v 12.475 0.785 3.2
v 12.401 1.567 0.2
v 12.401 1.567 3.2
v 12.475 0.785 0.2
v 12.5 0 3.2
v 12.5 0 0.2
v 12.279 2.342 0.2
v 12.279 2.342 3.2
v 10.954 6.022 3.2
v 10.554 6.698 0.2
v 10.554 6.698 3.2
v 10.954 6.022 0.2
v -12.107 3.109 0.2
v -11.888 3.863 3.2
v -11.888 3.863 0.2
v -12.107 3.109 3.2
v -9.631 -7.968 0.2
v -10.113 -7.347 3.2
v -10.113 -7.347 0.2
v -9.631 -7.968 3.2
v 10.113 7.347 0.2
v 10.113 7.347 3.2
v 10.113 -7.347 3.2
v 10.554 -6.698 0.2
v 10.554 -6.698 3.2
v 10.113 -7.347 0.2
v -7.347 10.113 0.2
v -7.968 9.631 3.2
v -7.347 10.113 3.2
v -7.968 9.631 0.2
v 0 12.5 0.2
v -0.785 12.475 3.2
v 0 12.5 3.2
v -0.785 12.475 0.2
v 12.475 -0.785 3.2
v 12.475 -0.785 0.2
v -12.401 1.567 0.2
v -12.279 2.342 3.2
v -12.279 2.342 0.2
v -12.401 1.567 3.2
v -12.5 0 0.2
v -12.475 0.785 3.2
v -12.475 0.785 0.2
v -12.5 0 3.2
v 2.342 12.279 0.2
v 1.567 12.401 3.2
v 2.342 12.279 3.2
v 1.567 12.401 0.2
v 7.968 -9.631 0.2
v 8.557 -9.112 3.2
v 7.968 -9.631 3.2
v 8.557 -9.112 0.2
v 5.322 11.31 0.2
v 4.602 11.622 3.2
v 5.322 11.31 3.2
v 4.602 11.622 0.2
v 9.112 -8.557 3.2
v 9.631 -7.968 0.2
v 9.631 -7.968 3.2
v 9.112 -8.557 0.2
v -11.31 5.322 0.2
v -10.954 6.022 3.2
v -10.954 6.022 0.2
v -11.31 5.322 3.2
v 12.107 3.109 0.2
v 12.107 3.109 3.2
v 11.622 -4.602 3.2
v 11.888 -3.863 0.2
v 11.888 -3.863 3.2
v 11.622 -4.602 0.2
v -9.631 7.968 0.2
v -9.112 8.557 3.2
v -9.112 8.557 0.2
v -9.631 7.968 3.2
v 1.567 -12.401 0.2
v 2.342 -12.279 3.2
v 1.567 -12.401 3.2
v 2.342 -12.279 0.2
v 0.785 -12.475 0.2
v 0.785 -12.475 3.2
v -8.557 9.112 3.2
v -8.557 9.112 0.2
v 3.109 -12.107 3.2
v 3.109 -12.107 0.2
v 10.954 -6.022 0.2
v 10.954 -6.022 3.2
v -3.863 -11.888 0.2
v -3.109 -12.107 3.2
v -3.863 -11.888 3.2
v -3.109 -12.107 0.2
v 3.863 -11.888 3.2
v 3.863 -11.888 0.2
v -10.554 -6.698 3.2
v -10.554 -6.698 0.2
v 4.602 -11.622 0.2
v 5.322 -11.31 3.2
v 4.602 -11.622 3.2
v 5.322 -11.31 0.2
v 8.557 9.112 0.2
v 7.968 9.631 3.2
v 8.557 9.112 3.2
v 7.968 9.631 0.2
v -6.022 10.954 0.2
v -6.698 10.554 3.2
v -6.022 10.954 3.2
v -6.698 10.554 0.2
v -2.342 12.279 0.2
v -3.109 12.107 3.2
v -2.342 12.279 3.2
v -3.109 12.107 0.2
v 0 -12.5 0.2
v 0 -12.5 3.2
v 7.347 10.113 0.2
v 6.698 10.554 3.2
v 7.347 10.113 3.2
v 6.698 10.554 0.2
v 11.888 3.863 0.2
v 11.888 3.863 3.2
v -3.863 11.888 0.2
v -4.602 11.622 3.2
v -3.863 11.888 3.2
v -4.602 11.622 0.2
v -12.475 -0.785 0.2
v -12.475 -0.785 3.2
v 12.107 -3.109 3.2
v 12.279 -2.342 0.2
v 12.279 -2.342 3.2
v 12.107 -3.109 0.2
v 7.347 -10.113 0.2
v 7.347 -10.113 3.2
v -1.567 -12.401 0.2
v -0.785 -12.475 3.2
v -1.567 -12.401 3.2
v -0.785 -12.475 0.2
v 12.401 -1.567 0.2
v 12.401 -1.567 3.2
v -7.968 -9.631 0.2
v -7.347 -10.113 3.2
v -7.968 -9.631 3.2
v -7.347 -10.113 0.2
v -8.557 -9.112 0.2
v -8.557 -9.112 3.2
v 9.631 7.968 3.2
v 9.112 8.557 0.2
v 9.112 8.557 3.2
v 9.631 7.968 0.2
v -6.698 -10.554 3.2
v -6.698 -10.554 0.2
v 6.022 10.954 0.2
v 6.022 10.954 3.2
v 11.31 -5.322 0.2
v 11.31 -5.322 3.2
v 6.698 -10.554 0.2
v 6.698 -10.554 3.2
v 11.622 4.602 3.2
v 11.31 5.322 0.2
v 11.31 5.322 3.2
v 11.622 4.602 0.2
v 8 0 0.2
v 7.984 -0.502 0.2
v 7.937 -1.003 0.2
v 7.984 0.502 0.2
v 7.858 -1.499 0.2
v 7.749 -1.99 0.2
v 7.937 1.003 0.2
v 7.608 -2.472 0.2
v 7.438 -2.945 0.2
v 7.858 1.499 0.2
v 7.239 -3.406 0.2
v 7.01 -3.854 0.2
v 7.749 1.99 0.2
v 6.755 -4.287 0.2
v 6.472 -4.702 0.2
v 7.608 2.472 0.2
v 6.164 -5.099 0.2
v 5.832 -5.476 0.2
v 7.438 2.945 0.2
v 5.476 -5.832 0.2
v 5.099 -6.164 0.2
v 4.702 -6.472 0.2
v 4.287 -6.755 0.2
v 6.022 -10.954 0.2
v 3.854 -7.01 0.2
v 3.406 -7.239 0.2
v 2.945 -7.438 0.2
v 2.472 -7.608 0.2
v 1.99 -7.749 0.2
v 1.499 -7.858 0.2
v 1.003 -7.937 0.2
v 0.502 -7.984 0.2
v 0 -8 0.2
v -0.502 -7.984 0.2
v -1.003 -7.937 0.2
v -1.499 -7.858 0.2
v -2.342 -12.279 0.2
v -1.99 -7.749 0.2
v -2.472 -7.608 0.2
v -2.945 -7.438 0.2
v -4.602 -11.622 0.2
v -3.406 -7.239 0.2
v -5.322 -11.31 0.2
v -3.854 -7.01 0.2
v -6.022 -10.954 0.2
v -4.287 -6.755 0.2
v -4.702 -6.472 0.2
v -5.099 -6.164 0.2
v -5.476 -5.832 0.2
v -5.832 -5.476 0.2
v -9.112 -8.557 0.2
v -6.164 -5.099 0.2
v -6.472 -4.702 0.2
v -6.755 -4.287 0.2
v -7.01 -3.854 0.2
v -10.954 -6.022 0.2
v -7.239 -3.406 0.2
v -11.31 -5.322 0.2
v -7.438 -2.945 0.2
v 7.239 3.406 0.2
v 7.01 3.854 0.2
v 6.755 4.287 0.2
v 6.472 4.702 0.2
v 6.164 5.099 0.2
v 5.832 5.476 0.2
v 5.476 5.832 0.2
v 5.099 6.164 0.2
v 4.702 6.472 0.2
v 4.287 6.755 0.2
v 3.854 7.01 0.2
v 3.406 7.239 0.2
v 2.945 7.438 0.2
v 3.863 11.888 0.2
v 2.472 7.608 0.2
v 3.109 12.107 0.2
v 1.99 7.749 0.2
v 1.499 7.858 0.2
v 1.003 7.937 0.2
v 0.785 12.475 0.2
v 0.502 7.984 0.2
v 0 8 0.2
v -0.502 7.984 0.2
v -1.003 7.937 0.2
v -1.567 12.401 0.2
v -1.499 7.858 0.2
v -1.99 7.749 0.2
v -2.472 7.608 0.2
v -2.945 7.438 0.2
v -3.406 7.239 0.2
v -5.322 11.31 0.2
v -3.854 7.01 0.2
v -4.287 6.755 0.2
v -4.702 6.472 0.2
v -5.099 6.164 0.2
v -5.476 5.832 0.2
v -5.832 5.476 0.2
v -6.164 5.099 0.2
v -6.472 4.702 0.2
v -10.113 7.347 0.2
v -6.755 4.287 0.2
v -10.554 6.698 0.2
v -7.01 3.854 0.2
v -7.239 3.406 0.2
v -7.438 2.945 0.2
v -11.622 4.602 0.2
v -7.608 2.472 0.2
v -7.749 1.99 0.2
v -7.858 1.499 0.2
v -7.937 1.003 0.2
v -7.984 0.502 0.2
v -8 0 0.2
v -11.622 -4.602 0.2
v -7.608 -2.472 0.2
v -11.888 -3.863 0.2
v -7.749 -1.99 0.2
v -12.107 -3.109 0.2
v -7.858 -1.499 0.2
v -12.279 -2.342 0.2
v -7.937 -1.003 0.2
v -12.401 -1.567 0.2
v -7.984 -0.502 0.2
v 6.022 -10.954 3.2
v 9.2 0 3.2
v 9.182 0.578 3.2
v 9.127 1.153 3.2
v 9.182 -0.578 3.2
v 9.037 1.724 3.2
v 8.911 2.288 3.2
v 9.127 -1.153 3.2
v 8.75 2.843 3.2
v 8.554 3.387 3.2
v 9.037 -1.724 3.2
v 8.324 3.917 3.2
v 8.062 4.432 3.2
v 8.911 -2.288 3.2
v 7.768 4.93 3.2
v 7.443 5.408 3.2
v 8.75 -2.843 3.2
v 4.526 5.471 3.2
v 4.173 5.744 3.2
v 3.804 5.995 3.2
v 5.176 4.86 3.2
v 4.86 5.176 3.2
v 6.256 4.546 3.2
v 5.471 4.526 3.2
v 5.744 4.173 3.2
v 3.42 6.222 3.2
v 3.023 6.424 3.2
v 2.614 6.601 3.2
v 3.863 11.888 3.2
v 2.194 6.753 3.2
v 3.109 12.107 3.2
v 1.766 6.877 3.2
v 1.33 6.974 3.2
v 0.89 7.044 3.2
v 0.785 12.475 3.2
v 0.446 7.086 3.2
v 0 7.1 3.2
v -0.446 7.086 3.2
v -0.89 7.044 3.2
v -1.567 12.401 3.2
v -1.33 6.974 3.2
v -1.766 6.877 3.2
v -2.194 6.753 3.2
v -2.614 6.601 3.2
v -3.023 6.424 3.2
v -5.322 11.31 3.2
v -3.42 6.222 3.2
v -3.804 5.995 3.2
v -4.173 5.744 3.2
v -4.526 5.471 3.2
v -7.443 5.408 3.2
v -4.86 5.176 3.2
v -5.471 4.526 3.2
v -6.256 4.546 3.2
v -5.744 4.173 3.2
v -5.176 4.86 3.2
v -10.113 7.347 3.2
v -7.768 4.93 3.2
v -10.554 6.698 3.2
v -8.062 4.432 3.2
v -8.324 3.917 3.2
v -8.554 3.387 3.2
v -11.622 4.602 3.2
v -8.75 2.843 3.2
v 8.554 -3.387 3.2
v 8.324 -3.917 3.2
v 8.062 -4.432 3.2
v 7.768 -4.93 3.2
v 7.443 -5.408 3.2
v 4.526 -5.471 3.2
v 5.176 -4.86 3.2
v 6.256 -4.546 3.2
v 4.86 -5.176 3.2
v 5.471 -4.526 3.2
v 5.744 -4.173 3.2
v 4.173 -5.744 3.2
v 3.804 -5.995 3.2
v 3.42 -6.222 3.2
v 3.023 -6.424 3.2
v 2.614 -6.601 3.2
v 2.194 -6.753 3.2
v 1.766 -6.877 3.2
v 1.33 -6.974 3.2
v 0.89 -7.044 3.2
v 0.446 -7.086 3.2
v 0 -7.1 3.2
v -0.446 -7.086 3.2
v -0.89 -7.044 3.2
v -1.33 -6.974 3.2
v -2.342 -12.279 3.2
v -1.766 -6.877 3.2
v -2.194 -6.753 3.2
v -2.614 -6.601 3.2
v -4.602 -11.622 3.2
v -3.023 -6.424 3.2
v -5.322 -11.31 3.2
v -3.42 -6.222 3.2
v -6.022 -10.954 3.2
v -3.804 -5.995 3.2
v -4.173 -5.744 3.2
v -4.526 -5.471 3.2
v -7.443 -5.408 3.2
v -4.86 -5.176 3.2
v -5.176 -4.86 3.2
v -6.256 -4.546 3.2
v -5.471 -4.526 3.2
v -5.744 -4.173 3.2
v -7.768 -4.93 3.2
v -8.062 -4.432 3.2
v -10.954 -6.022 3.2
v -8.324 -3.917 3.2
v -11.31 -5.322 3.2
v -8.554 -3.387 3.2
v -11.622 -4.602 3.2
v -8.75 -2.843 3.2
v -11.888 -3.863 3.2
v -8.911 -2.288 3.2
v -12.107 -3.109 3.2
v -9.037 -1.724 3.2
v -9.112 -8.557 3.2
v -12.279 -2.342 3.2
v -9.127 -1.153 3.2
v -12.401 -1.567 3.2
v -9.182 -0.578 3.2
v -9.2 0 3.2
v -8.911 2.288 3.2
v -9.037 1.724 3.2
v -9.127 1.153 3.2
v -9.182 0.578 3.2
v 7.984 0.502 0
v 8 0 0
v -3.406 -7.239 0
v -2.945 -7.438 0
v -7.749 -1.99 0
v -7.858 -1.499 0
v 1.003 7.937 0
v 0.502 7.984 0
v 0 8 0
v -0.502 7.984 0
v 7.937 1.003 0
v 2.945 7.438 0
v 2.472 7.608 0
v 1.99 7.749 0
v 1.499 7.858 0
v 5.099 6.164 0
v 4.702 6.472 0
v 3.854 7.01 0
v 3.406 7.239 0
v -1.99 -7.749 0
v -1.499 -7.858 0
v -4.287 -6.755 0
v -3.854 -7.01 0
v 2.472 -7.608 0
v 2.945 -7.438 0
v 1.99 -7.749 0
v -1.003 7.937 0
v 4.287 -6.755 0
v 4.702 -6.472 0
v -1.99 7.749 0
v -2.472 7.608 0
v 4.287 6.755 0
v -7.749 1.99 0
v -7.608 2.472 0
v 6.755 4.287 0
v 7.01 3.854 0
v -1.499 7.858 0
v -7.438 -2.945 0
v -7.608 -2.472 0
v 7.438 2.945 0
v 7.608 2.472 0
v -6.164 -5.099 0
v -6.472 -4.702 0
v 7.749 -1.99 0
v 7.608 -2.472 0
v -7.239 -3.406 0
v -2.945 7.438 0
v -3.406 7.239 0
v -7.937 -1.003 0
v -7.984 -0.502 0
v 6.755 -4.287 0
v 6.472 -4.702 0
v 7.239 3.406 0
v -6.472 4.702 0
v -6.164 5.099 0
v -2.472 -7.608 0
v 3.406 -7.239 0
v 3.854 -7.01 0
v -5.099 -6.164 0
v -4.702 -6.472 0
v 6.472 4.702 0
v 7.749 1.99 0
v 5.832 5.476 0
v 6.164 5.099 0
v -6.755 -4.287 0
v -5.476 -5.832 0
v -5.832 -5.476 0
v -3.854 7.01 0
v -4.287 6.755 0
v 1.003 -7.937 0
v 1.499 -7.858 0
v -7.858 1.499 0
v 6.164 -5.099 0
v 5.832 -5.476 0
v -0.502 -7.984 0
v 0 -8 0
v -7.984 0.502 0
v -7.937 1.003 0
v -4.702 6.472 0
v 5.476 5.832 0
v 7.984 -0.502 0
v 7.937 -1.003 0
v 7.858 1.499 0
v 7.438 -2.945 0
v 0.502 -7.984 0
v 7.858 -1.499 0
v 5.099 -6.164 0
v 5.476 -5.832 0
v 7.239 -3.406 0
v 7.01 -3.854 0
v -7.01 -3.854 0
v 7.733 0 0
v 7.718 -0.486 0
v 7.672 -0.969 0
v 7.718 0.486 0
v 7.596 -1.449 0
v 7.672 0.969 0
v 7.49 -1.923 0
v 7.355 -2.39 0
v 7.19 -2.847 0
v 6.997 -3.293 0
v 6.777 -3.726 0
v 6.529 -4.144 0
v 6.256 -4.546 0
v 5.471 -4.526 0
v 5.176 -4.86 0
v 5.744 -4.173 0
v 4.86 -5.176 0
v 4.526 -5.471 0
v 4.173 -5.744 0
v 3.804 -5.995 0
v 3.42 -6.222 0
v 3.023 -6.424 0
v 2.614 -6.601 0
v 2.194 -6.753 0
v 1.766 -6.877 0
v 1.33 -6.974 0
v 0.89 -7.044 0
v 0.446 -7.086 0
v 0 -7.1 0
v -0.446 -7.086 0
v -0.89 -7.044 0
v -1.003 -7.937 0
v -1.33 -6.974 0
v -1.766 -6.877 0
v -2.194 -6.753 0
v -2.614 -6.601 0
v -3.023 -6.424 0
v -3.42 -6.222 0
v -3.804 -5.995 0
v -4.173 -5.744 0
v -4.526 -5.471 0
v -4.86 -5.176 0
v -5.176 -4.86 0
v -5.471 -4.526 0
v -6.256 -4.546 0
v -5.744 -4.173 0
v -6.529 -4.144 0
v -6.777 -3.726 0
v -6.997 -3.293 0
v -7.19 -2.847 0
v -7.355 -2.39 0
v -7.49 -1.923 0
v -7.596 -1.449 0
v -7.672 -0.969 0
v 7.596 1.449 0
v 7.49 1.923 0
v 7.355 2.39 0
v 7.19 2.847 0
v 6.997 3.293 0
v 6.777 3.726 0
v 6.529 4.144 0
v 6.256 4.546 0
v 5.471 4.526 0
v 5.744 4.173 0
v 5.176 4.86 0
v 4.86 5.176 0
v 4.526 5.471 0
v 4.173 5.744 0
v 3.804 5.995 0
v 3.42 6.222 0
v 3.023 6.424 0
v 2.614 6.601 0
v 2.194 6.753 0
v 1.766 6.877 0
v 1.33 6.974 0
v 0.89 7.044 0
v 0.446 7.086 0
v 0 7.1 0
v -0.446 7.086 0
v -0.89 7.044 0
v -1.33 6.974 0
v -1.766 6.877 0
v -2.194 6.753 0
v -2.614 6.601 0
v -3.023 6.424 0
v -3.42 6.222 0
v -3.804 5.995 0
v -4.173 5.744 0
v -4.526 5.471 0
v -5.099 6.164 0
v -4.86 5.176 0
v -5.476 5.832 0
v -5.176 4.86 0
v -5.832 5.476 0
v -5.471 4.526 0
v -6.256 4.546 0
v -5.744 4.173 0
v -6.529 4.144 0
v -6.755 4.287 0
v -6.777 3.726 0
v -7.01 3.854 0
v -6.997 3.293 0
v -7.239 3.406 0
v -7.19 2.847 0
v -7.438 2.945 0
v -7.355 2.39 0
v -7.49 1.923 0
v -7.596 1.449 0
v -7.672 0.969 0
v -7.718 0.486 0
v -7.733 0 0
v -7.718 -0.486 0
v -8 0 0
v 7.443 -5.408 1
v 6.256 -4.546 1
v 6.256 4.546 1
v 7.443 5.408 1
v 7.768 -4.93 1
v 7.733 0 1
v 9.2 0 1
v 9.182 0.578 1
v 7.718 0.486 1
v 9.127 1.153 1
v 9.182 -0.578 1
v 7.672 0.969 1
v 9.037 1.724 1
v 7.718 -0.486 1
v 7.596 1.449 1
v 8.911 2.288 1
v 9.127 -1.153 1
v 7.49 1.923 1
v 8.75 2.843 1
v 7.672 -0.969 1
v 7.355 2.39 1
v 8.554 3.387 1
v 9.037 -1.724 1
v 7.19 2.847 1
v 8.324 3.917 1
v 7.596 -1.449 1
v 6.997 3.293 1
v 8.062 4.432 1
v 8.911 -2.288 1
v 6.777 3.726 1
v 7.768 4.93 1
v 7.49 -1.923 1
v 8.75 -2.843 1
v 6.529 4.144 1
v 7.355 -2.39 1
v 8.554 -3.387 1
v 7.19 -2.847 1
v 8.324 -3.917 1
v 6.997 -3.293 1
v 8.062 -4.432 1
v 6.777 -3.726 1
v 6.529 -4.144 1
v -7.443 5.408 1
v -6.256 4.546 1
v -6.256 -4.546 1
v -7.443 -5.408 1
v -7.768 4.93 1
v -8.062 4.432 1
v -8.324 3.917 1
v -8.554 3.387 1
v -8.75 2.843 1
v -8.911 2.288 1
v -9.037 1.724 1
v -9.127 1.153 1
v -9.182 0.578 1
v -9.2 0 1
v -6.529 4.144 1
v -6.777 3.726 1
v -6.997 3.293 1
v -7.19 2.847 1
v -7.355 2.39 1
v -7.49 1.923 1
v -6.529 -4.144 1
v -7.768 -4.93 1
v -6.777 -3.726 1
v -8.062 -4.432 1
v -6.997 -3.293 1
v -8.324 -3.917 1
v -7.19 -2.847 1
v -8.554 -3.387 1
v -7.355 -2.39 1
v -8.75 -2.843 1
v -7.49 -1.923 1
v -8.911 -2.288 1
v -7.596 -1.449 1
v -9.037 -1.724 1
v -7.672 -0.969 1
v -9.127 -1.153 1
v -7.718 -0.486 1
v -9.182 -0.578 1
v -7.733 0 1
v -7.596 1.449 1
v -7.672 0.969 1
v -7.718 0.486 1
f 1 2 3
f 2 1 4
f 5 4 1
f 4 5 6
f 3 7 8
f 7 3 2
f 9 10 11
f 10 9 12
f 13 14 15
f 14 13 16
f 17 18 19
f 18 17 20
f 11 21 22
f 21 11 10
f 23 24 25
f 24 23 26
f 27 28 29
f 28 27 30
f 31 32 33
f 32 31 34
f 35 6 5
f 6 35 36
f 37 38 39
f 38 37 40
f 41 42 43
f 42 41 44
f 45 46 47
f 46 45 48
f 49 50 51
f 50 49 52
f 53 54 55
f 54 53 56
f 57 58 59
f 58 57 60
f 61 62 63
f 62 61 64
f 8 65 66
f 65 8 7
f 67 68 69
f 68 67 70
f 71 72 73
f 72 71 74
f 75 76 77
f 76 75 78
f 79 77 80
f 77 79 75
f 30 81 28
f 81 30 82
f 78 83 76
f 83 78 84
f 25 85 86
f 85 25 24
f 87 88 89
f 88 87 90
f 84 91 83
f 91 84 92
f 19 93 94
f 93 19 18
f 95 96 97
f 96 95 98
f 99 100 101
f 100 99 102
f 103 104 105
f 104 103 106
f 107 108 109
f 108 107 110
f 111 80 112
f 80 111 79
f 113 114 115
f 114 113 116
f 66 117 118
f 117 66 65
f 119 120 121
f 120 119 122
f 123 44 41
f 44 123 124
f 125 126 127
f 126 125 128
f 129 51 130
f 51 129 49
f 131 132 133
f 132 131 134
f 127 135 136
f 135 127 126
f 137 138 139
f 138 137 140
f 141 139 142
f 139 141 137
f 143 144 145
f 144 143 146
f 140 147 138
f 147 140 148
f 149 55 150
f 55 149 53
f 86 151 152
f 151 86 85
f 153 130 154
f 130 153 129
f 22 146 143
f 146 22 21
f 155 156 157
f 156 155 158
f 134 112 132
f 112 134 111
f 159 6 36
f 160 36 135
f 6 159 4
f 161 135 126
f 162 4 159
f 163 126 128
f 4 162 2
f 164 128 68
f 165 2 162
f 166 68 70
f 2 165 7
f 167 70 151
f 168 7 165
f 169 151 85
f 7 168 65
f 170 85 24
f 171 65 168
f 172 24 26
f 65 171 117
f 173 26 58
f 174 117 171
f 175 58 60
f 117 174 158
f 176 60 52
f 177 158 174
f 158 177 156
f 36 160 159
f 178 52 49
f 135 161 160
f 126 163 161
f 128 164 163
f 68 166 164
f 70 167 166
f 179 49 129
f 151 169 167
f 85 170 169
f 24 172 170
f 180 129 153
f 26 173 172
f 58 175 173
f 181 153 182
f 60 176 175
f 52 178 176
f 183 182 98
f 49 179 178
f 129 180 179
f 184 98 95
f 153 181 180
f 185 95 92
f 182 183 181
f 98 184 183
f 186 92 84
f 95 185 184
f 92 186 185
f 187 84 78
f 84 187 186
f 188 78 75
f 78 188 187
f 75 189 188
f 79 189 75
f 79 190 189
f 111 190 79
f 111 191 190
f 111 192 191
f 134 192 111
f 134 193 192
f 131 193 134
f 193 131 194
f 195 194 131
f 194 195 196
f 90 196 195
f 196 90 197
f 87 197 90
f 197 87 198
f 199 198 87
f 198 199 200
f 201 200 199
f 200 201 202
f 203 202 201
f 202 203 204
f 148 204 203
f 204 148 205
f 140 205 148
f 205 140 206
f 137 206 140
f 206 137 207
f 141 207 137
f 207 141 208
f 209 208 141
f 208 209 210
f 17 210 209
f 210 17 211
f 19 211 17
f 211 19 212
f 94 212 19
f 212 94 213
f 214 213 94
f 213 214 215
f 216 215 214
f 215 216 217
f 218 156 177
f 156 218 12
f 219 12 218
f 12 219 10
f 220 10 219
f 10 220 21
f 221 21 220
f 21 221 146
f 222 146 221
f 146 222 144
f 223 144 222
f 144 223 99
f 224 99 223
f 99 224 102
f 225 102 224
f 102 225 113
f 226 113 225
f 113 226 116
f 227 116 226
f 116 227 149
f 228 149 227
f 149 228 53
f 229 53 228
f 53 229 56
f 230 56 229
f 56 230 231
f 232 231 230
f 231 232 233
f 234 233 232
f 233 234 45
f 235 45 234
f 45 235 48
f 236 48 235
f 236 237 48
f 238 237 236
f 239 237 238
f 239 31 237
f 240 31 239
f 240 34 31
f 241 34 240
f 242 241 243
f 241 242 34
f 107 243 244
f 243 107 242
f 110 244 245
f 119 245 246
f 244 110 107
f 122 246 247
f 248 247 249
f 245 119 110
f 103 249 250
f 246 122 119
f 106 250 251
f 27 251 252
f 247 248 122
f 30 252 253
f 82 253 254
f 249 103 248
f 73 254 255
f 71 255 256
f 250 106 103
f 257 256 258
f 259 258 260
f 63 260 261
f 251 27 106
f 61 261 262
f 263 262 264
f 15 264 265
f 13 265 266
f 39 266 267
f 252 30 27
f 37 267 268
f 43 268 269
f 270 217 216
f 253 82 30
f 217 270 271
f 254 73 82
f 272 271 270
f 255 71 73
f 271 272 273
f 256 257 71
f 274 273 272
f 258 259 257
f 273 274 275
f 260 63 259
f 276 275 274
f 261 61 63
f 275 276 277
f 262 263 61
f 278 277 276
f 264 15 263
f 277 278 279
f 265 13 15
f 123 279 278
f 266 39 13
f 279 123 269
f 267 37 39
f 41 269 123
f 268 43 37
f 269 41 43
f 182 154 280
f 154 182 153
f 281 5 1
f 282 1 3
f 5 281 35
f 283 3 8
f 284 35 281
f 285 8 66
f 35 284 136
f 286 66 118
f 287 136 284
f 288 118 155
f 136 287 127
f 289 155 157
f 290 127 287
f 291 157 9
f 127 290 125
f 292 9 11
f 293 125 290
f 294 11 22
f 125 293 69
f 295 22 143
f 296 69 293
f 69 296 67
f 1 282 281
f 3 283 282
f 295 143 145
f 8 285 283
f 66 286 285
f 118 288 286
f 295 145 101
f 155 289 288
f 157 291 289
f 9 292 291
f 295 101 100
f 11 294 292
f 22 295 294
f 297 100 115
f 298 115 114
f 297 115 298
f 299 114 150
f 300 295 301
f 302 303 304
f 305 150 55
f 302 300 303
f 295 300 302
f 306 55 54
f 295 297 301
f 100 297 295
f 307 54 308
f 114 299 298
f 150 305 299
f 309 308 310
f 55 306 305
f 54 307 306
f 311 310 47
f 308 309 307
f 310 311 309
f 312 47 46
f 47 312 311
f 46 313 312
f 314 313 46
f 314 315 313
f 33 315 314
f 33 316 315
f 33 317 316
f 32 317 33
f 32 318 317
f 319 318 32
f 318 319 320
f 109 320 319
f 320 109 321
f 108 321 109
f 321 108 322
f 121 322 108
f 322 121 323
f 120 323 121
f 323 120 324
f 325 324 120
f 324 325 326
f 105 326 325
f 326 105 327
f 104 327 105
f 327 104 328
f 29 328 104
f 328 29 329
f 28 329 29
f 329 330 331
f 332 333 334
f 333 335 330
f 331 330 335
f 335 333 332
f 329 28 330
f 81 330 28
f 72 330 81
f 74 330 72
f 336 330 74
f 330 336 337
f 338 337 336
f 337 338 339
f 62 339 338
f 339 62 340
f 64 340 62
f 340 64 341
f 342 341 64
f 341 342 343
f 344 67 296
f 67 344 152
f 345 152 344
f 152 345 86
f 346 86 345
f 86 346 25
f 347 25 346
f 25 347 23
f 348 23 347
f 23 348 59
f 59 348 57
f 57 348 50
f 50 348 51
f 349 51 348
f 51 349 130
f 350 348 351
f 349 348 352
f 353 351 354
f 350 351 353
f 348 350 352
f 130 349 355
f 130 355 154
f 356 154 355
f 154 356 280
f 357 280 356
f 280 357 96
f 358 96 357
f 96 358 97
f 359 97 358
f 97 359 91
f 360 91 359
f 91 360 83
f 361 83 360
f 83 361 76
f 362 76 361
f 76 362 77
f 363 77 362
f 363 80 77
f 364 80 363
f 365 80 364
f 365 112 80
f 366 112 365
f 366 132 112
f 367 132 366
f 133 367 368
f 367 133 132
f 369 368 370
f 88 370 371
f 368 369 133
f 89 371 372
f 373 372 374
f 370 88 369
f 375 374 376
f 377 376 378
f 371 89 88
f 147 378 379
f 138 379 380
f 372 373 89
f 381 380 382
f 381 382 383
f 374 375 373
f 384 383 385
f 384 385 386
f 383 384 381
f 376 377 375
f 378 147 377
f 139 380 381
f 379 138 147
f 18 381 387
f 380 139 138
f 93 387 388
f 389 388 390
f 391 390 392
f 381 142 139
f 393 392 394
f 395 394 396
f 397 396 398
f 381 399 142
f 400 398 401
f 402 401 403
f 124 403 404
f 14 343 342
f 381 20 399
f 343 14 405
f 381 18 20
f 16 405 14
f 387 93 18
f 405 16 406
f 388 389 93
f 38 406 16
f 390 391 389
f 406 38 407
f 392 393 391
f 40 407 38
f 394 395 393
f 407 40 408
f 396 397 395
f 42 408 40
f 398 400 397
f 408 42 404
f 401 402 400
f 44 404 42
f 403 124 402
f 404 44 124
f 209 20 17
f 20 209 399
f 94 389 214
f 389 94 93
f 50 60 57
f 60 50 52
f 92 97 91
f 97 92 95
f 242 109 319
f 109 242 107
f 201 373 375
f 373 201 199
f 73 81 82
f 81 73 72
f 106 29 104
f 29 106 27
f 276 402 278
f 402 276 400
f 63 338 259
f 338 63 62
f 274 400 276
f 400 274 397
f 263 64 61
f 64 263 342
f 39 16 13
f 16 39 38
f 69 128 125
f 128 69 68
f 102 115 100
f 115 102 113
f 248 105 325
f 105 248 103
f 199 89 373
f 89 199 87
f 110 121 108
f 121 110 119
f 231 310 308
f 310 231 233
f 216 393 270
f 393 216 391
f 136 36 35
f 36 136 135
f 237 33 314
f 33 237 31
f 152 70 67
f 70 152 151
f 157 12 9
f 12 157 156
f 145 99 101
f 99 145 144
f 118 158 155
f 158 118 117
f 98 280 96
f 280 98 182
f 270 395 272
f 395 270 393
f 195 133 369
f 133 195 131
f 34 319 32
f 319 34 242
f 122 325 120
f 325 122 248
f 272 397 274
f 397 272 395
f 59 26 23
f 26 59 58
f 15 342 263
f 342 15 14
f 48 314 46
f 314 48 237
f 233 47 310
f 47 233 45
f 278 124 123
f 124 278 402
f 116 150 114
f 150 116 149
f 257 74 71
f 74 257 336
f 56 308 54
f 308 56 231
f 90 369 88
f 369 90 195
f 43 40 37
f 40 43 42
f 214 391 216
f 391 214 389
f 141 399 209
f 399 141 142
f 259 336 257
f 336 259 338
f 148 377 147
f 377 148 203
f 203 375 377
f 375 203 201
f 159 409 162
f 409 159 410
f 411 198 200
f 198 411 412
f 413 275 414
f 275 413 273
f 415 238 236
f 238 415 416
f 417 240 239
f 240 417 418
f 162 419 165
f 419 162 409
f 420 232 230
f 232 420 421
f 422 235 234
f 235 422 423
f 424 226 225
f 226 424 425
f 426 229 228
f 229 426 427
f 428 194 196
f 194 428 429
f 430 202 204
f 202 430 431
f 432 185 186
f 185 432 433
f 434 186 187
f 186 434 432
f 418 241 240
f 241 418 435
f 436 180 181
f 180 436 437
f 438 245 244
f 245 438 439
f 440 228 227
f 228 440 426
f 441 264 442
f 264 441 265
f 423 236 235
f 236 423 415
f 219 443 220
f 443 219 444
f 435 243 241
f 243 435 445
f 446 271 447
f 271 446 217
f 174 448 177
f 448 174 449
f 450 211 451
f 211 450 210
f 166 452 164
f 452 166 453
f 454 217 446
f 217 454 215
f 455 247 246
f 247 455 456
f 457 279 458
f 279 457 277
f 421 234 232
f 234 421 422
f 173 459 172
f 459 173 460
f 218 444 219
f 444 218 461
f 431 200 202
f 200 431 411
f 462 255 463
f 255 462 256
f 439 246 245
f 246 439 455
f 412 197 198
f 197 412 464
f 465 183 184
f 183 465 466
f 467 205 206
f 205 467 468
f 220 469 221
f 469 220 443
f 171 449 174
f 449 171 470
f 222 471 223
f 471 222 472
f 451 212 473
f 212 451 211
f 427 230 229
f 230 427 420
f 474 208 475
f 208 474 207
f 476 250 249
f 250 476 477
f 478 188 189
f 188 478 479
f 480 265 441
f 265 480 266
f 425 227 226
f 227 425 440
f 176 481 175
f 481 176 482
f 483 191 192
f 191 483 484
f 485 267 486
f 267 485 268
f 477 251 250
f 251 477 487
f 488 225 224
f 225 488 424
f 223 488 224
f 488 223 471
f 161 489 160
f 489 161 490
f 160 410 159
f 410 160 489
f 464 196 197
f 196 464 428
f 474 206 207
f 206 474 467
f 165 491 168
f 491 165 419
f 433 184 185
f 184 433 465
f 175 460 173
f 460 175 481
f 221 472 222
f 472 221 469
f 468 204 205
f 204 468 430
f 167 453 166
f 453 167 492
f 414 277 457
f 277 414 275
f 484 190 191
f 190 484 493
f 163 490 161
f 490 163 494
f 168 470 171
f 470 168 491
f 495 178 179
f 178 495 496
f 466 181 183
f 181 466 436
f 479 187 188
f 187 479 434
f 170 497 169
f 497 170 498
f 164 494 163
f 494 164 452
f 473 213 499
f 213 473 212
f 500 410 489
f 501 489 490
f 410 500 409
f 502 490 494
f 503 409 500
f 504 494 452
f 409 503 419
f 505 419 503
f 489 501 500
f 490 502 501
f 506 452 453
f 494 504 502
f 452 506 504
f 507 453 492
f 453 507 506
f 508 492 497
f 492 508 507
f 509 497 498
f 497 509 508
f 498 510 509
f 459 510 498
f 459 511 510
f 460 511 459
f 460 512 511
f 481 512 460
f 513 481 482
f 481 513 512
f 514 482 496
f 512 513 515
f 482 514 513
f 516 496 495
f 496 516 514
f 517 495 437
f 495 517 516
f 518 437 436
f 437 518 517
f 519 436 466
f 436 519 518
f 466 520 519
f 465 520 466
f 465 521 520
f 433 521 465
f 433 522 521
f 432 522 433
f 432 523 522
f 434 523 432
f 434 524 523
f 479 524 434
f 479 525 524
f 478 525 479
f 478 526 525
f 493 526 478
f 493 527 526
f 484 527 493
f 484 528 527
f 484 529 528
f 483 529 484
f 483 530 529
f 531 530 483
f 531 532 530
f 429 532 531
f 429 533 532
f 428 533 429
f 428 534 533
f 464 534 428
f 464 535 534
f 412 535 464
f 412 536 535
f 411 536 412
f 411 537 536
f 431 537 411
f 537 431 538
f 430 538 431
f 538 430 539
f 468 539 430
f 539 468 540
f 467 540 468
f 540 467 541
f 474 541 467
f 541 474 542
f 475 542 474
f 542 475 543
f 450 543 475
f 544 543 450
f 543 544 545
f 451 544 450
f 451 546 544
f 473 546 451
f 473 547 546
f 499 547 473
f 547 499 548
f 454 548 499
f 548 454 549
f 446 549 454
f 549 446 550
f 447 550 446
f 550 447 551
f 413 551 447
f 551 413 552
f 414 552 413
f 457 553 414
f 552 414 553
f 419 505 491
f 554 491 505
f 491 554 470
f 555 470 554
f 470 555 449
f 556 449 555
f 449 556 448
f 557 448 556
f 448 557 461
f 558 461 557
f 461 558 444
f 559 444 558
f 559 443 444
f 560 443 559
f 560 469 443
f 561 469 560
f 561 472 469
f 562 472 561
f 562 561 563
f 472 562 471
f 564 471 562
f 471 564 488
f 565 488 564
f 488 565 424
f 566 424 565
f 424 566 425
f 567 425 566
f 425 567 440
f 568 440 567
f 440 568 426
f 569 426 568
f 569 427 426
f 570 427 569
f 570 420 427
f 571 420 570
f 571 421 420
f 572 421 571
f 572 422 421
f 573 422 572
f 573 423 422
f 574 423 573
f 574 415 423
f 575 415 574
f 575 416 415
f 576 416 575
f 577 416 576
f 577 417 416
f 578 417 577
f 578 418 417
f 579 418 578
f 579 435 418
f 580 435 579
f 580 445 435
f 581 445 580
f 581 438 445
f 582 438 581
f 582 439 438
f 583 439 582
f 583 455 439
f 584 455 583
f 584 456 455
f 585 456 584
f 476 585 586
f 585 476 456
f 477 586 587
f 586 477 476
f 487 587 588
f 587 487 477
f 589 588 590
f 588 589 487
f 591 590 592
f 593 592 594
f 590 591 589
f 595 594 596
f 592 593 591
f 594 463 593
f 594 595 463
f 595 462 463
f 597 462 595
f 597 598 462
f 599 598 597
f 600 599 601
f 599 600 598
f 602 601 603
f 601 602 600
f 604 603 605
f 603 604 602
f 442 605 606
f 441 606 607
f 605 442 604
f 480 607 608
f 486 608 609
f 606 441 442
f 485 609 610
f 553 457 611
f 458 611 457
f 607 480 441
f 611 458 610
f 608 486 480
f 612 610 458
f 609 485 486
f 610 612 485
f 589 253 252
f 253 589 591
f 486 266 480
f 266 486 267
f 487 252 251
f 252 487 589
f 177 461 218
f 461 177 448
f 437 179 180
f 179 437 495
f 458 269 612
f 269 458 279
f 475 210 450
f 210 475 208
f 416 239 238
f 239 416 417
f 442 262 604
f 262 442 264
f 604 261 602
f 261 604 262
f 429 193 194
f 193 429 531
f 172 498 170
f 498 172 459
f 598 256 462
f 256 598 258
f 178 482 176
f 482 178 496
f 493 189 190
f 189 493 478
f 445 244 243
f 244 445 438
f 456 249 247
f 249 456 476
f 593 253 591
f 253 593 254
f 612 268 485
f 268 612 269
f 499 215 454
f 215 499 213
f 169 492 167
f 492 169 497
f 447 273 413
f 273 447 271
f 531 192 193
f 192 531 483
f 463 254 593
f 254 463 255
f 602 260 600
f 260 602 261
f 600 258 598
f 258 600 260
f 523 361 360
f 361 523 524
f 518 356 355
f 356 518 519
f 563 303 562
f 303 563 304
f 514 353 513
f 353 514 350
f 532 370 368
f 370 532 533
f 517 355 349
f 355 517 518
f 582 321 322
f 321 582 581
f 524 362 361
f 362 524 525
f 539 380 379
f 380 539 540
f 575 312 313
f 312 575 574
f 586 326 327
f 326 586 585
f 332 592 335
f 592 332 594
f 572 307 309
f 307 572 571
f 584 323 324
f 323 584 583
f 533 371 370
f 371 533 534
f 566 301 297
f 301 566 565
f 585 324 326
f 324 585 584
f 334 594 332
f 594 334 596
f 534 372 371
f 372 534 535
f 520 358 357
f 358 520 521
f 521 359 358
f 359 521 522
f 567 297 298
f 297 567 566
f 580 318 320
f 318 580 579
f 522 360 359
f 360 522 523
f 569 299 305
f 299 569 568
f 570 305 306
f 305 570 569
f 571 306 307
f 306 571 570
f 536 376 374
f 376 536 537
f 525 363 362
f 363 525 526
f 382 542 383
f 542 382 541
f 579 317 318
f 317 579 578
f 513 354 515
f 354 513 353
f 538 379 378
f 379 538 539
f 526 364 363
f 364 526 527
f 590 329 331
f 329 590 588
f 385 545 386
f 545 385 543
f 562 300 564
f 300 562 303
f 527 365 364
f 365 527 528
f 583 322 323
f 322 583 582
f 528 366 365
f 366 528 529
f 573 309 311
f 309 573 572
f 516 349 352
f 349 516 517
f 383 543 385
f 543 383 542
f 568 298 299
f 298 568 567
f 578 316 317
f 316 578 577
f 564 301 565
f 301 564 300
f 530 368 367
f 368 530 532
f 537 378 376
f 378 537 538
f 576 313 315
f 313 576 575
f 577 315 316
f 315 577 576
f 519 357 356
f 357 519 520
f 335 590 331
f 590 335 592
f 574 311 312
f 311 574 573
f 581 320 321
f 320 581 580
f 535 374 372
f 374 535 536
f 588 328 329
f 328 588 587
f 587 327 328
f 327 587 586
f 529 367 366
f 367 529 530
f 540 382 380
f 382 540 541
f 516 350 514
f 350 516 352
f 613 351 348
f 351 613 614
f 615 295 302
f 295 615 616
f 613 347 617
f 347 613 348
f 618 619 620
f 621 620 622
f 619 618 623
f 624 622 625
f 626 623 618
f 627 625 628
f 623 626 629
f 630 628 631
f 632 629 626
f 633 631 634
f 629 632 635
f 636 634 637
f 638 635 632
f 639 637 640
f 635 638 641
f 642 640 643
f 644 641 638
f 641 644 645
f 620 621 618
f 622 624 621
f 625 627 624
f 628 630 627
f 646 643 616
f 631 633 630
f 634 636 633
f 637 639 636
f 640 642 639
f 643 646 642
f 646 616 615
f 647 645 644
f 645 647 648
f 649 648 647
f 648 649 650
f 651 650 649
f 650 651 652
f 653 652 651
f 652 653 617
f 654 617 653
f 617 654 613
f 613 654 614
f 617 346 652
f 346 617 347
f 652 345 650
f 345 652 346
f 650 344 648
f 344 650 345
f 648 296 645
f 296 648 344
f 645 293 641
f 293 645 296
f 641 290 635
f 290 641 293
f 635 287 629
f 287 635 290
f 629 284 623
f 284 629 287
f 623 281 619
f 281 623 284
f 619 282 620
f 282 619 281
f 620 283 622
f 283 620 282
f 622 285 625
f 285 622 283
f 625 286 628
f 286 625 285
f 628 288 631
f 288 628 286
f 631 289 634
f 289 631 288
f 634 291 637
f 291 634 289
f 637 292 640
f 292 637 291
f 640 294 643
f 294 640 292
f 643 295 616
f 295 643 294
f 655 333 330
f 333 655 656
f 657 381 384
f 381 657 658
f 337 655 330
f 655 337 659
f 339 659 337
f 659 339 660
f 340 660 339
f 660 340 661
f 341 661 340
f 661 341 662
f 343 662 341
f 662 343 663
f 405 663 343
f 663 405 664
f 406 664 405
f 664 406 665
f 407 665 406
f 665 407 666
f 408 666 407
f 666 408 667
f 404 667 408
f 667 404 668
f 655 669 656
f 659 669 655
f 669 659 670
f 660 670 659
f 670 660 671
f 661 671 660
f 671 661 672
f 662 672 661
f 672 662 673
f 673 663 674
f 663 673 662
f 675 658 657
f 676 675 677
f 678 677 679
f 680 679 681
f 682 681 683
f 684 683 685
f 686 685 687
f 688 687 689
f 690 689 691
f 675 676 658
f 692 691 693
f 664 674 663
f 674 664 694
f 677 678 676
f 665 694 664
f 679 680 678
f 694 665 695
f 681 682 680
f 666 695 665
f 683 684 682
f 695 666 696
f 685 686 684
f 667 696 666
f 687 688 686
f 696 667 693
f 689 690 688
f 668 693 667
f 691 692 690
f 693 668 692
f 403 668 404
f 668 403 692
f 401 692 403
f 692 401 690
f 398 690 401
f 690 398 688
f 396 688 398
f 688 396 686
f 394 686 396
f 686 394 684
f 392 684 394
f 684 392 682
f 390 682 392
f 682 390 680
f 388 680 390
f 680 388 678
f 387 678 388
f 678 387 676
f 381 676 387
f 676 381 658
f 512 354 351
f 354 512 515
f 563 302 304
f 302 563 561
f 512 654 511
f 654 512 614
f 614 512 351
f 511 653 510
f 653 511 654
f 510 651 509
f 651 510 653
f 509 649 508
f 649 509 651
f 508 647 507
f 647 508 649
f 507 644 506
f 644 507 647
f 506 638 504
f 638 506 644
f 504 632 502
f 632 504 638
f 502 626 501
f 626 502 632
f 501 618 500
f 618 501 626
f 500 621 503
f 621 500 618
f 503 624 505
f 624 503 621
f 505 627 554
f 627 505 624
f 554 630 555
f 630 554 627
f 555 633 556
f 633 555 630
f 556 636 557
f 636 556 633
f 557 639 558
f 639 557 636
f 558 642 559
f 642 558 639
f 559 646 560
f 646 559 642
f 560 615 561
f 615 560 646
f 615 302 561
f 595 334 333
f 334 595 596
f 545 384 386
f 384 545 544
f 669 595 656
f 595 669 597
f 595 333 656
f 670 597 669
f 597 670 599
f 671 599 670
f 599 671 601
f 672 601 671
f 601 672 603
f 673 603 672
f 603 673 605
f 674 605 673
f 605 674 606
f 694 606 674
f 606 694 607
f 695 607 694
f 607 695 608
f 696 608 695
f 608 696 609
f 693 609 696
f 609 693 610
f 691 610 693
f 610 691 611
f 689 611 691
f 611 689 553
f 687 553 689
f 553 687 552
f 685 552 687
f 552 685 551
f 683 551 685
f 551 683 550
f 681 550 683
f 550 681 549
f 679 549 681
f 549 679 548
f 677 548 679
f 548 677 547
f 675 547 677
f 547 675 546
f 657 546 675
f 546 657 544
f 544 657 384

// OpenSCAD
// Grommet
// by Nathan Wittstock <nate@fardog.io>

// preview[view: south east, tilt: top diagonal]

/* [Part] */
part = "outer"; // ["outer", "inner", "both"]

/* [Dimensions] */
opening_diameter_mm = 12;
cap_outer_diameter_mm = 25;
cap_inner_diameter_mm = 20;
cap_interface_thickness_mm = 3;

wall_thickness_mm = 2;
passthrough_thickness_mm = 2;
passthrough_distance_mm = 0.2;

clip_mm = 2;

/* [Tolerances] */
cylinder_tolerance_mm = 0.2;
clip_tolerance_mm = 0.2;

/* [Hidden] */
cap_total_height = cap_interface_thickness_mm + passthrough_distance_mm;
clip_o_mm = clip_mm + clip_tolerance_mm;

$fn=100;

module cap() {
    union() {
        cylinder(
            h=cap_interface_thickness_mm,
            d=cap_outer_diameter_mm
        );
    }
}

module outer() {
    clip_x = opening_diameter_mm+wall_thickness_mm;
    difference() {
        union() {
            translate([0, 0, passthrough_distance_mm]) cap();
            cylinder(
                h=passthrough_distance_mm,
                d=opening_diameter_mm+wall_thickness_mm*2
            );
        }
        cylinder(
            h=cap_total_height,
            d=opening_diameter_mm+cylinder_tolerance_mm+wall_thickness_mm
        );
        rotate([0, 0, -36])
            rotate_extrude(angle=72, convexity=100)
                translate([clip_x/2, cap_total_height-clip_o_mm, 0])
                    square([clip_o_mm, clip_o_mm]);
        rotate([0, 0, 144])
            rotate_extrude(angle=72, convexity=100)
                translate([clip_x/2, cap_total_height-clip_o_mm, 0])
                    square([clip_o_mm, clip_o_mm]);

        rotate([0, 0, -36])
            rotate_extrude(angle=72, convexity=100)
                translate([clip_x/2, 0, 0])
                    square([clip_o_mm/3, cap_total_height]);
        rotate([0, 0, 144])
            rotate_extrude(angle=72, convexity=100)
                translate([clip_x/2, 0, 0])
                    square([clip_o_mm/3, cap_total_height]);

    }
}

module inner() {
    clip_x = opening_diameter_mm+wall_thickness_mm;
    difference() {
        union() {
            translate([0, 0, cap_total_height]) cap();
            cylinder(
                h=cap_total_height,
                d=opening_diameter_mm+wall_thickness_mm
            );
            rotate([0, 0, -35])
                rotate_extrude(angle=70, convexity=100)
                    translate([clip_x/2, clip_mm, 0])
                        polygon(points=[[0, 0], [clip_mm, 0], [0, -clip_mm]]);
            rotate([0, 0, 145])
                rotate_extrude(angle=70, convexity=100)
                    translate([clip_x/2, clip_mm, 0])
                        polygon(points=[[0, 0], [clip_mm, 0], [0, -clip_mm]]);
        }
        cylinder(
            h=passthrough_distance_mm+cap_total_height*2,
            d=opening_diameter_mm
        );
    }
}

if (part == "outer") {
    outer();
} else if (part == "inner") {
    inner();
} else {
    outer();
    translate([0, 0, cap_total_height])
        rotate([0, 180, 0]) inner();
}
